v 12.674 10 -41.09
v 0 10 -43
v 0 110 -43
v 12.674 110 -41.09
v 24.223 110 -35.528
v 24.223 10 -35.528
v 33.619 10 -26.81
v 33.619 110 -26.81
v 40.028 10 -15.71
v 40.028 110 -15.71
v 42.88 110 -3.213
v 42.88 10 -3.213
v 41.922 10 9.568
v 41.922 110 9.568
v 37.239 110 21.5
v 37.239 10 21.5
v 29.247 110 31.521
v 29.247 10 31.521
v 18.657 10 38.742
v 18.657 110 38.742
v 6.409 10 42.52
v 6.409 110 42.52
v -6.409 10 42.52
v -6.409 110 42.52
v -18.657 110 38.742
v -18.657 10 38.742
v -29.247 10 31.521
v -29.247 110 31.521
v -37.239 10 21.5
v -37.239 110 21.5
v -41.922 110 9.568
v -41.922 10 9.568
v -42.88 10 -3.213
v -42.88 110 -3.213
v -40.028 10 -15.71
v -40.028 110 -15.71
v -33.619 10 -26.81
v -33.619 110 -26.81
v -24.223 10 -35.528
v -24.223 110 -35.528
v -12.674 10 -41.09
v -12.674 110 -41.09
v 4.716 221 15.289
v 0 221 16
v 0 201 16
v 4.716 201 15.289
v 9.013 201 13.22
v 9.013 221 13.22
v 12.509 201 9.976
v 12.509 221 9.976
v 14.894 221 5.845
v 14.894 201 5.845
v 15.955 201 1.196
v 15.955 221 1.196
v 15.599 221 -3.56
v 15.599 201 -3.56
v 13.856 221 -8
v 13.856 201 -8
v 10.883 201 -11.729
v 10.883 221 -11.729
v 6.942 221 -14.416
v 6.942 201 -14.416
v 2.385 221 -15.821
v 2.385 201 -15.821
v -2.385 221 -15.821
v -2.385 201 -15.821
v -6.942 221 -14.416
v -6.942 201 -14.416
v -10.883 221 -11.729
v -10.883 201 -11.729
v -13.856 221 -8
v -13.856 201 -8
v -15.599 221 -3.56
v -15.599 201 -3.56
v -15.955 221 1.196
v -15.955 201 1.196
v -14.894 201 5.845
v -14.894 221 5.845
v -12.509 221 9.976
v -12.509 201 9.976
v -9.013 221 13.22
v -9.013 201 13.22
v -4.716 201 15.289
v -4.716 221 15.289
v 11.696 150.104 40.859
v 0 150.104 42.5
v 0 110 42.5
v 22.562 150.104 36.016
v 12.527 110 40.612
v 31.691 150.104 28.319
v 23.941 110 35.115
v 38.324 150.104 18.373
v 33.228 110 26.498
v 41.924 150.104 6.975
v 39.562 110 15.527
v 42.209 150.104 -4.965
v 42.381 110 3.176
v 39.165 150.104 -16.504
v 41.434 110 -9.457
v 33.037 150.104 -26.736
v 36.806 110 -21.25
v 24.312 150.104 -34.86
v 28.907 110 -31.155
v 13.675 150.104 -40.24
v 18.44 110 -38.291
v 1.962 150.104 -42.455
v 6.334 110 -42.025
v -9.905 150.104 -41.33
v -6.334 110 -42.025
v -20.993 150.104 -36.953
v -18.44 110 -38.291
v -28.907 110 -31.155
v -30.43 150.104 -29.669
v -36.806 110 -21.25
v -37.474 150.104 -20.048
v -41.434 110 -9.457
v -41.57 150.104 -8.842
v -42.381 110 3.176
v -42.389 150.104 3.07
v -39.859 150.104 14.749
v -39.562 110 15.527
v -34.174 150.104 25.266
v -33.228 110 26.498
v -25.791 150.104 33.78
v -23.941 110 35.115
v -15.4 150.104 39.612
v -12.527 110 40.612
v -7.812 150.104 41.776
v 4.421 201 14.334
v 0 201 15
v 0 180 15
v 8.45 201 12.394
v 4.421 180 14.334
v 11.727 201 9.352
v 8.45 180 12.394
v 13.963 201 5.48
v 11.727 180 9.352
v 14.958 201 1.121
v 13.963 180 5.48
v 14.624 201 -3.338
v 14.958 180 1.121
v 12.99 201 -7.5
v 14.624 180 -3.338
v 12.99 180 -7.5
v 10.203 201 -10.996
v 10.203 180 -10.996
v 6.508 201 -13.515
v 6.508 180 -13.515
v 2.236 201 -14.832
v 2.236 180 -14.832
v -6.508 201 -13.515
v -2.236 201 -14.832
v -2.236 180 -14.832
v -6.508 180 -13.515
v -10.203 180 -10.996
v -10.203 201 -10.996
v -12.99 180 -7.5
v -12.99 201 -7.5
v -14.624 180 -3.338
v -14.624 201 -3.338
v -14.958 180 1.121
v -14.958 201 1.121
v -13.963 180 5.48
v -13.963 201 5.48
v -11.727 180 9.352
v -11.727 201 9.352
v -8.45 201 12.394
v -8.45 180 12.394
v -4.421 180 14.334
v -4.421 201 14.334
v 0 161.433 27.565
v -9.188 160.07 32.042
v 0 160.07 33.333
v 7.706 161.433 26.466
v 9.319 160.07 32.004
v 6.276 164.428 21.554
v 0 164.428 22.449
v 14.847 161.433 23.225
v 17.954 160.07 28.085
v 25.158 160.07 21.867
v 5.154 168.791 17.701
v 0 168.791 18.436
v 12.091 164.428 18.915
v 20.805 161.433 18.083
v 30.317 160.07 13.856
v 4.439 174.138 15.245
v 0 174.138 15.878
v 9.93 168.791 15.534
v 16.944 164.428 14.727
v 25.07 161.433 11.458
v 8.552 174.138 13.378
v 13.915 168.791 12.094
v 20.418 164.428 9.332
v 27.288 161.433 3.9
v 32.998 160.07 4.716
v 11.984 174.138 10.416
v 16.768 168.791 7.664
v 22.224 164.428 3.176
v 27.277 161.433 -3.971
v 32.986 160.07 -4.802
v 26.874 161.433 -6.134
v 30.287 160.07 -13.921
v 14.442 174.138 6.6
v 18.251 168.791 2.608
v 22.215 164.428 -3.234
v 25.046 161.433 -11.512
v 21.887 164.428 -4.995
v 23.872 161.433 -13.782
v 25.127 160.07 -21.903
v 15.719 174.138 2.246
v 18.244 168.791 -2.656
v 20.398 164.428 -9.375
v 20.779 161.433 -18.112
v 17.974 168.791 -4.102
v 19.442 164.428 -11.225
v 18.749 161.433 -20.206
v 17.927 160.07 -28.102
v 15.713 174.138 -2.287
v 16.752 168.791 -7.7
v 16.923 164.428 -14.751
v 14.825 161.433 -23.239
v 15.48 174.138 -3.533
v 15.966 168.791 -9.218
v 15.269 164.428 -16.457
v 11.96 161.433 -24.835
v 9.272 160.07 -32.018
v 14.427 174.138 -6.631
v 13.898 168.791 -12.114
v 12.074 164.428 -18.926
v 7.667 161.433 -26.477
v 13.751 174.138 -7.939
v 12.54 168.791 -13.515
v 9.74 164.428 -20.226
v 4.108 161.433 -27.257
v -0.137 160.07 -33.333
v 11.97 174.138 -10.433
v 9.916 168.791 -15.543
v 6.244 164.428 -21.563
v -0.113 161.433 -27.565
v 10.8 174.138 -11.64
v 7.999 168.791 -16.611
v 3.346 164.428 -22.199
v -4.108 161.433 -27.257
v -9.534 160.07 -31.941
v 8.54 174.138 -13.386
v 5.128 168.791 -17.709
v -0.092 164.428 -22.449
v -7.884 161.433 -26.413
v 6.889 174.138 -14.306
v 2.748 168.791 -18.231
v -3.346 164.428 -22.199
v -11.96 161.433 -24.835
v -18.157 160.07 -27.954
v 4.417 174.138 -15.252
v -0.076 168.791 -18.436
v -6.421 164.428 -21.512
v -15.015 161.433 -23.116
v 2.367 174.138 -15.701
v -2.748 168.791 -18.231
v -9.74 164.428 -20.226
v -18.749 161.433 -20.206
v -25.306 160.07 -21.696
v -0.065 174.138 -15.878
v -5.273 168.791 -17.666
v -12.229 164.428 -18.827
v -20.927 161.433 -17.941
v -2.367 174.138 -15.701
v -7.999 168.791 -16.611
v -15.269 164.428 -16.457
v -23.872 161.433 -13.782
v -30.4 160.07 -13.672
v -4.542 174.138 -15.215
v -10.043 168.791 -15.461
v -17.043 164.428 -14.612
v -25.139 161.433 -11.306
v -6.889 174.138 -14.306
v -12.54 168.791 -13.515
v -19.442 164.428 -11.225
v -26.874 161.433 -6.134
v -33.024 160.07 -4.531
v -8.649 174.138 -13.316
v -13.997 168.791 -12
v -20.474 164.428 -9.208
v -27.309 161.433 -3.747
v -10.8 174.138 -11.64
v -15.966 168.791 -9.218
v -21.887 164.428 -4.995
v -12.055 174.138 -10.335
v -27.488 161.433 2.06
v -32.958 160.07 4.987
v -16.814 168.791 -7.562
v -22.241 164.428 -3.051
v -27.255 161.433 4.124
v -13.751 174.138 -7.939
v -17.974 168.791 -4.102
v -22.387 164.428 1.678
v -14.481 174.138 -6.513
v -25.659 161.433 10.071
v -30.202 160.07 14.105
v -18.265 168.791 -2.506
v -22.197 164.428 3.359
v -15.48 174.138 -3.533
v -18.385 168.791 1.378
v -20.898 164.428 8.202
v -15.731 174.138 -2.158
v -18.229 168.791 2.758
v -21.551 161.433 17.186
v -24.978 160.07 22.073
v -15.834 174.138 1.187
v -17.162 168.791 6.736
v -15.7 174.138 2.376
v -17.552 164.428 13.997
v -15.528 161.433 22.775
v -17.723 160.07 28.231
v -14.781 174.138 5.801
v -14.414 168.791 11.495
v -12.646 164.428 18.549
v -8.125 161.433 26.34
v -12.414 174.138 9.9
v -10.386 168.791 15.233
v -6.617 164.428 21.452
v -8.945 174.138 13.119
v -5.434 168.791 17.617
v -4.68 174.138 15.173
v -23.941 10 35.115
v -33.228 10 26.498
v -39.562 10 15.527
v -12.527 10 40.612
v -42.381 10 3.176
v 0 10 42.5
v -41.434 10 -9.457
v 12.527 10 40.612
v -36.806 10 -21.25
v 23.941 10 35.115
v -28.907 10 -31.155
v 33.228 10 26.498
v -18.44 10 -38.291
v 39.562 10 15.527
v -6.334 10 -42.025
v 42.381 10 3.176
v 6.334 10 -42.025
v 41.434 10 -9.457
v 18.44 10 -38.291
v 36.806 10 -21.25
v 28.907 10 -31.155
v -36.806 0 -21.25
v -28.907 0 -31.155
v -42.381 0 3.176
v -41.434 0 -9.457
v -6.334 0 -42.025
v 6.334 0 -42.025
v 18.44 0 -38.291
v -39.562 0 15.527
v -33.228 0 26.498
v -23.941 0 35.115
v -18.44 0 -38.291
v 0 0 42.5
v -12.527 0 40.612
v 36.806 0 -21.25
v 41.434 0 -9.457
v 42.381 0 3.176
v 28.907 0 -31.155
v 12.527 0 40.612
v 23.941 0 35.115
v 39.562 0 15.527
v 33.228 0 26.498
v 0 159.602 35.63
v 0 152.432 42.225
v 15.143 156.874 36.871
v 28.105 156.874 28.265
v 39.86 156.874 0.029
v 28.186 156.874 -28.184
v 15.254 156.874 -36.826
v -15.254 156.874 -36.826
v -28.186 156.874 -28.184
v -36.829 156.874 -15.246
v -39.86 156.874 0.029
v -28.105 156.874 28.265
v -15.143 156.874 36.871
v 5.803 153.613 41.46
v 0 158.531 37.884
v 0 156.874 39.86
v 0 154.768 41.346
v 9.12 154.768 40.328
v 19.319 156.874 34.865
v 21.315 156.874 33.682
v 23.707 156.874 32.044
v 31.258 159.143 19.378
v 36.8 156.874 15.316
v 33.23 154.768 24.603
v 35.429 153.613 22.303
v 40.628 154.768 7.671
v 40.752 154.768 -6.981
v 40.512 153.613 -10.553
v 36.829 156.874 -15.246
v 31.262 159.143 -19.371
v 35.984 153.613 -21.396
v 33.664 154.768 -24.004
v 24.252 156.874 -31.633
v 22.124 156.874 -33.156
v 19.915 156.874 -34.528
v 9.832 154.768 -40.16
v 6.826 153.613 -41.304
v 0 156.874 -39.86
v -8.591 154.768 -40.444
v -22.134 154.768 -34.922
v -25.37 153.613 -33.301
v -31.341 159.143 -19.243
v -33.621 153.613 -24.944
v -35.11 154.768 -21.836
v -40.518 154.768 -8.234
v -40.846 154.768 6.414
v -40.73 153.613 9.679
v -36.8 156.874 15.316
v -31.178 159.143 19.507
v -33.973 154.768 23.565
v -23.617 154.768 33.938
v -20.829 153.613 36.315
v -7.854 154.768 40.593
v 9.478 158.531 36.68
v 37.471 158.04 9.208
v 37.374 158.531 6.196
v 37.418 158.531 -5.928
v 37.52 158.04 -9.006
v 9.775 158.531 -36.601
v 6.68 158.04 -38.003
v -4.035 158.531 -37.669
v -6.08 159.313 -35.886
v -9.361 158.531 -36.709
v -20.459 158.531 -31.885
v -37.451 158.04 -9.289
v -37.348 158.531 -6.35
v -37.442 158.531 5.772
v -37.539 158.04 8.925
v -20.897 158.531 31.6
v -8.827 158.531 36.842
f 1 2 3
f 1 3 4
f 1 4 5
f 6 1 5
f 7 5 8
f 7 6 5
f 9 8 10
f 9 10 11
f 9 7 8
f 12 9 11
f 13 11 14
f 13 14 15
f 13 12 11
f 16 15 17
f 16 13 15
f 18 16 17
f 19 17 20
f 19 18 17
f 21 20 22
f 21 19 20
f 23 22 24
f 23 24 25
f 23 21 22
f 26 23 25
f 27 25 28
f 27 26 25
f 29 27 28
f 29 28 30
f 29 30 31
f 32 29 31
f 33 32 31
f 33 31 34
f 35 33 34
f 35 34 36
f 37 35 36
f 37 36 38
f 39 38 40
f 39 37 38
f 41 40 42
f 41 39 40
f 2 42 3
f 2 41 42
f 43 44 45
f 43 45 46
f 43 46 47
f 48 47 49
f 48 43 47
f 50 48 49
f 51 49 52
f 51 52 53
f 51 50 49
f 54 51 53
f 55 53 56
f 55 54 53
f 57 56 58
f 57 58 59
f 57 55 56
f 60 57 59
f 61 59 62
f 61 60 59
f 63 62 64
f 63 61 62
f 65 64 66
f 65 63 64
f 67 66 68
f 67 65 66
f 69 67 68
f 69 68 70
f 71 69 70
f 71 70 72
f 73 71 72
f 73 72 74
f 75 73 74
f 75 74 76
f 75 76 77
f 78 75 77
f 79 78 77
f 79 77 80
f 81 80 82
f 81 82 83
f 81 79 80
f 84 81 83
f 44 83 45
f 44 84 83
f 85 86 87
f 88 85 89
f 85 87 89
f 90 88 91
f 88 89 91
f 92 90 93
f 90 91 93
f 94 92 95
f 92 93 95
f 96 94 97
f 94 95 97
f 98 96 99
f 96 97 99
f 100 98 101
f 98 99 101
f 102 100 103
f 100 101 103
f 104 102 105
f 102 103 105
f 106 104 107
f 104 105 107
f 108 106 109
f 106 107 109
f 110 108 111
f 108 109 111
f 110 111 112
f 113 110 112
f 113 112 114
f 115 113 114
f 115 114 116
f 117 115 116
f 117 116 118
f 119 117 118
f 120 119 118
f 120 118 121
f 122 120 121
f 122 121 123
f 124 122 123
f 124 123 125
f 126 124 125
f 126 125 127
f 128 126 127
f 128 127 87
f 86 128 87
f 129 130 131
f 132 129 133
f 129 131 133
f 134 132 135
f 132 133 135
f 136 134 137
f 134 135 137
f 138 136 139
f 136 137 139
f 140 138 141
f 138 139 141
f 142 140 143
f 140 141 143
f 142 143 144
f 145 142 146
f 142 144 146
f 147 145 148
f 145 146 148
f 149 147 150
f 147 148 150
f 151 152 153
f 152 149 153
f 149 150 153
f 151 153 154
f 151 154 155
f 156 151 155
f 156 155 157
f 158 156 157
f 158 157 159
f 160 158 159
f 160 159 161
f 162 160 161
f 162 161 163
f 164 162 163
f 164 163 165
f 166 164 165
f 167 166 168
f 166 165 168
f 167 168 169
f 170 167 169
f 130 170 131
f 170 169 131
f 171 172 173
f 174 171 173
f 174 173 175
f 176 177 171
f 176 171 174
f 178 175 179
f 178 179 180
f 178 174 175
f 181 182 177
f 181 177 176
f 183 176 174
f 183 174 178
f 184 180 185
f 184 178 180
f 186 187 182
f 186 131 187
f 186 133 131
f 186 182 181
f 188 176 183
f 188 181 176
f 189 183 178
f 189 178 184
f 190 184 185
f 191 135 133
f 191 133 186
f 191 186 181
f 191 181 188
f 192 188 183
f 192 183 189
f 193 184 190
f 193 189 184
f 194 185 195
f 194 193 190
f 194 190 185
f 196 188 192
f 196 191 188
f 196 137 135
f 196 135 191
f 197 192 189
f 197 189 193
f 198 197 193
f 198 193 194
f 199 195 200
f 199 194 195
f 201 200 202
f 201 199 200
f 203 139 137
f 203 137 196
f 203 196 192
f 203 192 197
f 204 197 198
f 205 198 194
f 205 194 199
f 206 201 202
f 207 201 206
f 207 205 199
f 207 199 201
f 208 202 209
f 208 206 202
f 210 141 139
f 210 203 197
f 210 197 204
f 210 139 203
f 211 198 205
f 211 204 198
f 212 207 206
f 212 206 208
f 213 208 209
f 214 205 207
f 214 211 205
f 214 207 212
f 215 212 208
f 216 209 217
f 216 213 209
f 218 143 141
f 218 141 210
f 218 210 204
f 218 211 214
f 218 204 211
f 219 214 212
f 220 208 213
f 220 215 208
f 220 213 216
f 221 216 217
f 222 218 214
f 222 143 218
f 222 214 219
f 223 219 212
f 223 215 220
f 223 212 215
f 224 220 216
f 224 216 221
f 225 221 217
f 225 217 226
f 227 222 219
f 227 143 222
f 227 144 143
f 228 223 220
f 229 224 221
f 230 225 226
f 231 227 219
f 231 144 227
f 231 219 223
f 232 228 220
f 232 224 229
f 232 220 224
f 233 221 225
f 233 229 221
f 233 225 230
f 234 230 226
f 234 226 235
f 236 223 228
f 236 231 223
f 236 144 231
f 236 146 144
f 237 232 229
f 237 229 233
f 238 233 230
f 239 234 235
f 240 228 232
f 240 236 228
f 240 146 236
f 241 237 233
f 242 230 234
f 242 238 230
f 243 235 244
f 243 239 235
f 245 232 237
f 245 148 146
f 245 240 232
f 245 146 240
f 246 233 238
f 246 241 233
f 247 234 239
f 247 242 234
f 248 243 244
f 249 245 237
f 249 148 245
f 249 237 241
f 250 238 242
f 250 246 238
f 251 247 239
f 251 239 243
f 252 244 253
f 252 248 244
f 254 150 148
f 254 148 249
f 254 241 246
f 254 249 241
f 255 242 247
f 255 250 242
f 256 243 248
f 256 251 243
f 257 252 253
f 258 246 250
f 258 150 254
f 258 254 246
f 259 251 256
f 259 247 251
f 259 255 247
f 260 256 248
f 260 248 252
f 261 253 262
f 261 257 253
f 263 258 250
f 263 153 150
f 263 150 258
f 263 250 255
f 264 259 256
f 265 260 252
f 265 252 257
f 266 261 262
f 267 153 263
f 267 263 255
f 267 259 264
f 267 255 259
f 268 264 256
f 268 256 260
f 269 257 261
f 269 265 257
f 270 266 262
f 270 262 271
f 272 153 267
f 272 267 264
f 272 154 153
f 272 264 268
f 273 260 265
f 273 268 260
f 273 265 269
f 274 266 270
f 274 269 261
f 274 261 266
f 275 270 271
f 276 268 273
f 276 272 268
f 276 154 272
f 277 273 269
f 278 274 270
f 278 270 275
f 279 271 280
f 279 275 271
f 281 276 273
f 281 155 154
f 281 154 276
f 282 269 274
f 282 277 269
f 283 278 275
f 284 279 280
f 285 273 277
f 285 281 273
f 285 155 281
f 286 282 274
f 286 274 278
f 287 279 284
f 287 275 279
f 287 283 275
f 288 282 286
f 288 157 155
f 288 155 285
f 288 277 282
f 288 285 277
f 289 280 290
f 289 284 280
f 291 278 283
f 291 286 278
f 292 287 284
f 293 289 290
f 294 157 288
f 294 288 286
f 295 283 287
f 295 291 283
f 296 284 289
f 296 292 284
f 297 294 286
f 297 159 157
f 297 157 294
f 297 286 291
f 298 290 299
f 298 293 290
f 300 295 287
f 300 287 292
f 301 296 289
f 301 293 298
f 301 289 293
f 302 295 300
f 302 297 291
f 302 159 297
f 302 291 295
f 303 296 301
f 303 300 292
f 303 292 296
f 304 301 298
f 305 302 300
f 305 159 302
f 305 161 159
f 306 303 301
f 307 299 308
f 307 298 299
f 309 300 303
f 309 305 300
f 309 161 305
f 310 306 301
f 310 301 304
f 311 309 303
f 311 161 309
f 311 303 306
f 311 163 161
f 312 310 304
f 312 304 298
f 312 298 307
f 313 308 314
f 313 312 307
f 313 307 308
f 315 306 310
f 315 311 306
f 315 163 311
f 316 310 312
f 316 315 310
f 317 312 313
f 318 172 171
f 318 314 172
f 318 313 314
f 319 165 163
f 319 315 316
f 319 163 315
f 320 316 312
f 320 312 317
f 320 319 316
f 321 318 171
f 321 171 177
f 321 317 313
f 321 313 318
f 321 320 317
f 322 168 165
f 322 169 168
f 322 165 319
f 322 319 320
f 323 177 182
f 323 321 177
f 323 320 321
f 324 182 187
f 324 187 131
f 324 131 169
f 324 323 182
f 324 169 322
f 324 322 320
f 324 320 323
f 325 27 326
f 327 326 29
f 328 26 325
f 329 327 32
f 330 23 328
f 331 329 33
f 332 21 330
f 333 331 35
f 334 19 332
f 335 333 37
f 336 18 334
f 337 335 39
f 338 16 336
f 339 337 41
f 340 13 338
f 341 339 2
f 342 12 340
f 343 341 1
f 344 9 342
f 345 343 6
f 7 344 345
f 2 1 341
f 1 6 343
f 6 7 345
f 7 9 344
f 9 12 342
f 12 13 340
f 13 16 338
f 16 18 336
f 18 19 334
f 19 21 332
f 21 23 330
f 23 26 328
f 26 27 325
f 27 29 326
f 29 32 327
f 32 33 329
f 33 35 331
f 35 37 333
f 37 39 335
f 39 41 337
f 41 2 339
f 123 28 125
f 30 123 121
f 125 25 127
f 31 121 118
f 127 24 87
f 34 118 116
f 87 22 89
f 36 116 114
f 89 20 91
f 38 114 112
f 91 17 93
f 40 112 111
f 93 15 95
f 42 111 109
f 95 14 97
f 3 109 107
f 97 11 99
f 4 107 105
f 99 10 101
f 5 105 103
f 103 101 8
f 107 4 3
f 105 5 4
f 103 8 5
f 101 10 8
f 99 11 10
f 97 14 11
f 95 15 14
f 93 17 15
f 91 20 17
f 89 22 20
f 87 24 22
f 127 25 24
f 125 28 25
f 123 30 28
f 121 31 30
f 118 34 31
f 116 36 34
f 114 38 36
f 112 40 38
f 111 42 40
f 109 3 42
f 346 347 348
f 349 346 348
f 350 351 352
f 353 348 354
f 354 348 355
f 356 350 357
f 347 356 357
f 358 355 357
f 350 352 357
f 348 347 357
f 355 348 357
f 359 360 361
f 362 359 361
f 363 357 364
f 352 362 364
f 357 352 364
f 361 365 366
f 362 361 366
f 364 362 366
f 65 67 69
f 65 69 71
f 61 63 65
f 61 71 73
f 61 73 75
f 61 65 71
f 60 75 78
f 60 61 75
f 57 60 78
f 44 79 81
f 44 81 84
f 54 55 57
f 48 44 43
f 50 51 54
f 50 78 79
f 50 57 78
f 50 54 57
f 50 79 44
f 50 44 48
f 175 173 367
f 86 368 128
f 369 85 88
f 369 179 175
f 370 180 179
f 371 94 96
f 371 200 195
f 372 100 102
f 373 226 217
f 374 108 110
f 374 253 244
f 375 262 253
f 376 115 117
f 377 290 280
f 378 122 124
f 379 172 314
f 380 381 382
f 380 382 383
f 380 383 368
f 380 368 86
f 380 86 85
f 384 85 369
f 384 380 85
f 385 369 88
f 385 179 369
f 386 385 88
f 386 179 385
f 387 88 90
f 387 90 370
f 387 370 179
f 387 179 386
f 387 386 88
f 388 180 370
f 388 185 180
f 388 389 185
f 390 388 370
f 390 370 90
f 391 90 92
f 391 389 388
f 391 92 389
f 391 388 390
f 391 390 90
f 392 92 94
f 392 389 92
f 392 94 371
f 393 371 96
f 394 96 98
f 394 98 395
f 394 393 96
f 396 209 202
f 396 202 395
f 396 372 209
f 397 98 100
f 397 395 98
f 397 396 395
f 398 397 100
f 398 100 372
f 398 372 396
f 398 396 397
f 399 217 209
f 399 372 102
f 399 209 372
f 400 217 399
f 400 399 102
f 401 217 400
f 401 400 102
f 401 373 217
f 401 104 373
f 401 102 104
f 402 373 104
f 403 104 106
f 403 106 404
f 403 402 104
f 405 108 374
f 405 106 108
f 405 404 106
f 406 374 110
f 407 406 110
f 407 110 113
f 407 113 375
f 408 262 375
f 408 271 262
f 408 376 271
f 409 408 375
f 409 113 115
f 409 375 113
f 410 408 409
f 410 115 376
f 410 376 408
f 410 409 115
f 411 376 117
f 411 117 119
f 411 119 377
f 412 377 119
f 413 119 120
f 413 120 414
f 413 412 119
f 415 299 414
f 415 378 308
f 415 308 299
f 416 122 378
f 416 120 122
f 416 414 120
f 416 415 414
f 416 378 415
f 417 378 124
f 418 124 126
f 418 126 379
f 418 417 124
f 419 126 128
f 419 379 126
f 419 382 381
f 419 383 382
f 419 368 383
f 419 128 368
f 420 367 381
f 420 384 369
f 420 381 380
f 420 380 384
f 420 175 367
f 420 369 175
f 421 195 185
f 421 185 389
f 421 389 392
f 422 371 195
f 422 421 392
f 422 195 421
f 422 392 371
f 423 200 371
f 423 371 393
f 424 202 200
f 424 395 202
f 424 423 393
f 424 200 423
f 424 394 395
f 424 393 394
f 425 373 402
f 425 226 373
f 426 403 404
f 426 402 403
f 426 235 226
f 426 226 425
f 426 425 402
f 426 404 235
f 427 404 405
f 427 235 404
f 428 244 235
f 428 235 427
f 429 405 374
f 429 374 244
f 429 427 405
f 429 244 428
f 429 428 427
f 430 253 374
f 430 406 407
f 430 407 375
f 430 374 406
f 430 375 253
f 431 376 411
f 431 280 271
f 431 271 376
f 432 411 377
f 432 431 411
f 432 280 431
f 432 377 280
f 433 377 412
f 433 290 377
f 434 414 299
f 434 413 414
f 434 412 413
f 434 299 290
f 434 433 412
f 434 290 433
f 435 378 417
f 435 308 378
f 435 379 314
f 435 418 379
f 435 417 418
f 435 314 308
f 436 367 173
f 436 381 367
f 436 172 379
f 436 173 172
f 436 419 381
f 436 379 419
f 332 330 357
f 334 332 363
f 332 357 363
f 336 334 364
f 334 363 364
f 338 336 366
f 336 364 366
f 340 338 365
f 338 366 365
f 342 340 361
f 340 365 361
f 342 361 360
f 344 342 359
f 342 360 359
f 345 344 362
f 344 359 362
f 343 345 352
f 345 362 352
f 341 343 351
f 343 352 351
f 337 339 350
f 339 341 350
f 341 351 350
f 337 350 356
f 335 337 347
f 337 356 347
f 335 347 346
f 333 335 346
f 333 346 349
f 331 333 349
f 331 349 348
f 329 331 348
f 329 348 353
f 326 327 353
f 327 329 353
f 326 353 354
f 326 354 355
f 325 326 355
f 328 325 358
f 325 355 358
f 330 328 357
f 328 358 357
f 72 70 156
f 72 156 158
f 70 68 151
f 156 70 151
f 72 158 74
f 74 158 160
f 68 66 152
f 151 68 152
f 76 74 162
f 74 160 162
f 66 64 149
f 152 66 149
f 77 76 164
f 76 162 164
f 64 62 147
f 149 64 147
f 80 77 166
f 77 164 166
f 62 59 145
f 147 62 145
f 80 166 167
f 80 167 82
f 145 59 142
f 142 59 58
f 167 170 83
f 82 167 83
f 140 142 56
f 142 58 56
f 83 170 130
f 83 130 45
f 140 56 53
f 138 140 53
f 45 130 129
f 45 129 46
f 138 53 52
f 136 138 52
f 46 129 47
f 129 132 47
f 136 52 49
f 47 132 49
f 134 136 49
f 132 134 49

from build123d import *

# Parameters (mm, degrees)
SKETCH2_R           = 42.5
BOSS_EXTRUDE1_DEPTH = 160
SKETCH3_R           = 15
BOSS_EXTRUDE2_DEPTH = 60
FILLET1_R           = 20
FILLET2_R           = 10
BOSS_EXTRUDE3_START = 1
SKETCH4_R           = 16
BOSS_EXTRUDE3_DEPTH = 20
BOSS_EXTRUDE4_START = -10
SKETCH5_R           = 43
BOSS_EXTRUDE4_DEPTH = 100


with BuildPart() as part:
    # Sketch2 → Boss-Extrude1 (new body)
    with BuildSketch(Plane(origin=(0, 0, 0), x_dir=(1, 0, 0), z_dir=(0, 1, 0))):
        Circle(SKETCH2_R)
    extrude(amount=BOSS_EXTRUDE1_DEPTH)

    # Sketch3 → Boss-Extrude2 (add)
    with BuildSketch(Plane(origin=(0, 160, 0), x_dir=(1, 0, 0), z_dir=(0, 1, 0))):
        Circle(SKETCH3_R)
    extrude(amount=BOSS_EXTRUDE2_DEPTH)

    # Fillet1
    fillet1_edges = [part.edges().sort_by_distance(p)[0] for p in [
        (-15, 160, 0),
    ]]
    fillet(fillet1_edges, radius=FILLET1_R)

    # Fillet2
    fillet2_edges = [part.edges().sort_by_distance(p)[0] for p in [
        (-42.5, 160, 0),
    ]]
    fillet(fillet2_edges, radius=FILLET2_R)

    # Sketch4 → Boss-Extrude3 (add)
    with BuildSketch(Plane(origin=(0, 220, 0), x_dir=(1, 0, 0), z_dir=(0, 1, 0)).offset(BOSS_EXTRUDE3_START)):
        Circle(SKETCH4_R)
    extrude(amount=-BOSS_EXTRUDE3_DEPTH)

    # Sketch5 → Boss-Extrude4 (add)
    with BuildSketch(Plane.XZ.offset(BOSS_EXTRUDE4_START)):
        Circle(SKETCH5_R)
    extrude(amount=-BOSS_EXTRUDE4_DEPTH)


solid = part.part
